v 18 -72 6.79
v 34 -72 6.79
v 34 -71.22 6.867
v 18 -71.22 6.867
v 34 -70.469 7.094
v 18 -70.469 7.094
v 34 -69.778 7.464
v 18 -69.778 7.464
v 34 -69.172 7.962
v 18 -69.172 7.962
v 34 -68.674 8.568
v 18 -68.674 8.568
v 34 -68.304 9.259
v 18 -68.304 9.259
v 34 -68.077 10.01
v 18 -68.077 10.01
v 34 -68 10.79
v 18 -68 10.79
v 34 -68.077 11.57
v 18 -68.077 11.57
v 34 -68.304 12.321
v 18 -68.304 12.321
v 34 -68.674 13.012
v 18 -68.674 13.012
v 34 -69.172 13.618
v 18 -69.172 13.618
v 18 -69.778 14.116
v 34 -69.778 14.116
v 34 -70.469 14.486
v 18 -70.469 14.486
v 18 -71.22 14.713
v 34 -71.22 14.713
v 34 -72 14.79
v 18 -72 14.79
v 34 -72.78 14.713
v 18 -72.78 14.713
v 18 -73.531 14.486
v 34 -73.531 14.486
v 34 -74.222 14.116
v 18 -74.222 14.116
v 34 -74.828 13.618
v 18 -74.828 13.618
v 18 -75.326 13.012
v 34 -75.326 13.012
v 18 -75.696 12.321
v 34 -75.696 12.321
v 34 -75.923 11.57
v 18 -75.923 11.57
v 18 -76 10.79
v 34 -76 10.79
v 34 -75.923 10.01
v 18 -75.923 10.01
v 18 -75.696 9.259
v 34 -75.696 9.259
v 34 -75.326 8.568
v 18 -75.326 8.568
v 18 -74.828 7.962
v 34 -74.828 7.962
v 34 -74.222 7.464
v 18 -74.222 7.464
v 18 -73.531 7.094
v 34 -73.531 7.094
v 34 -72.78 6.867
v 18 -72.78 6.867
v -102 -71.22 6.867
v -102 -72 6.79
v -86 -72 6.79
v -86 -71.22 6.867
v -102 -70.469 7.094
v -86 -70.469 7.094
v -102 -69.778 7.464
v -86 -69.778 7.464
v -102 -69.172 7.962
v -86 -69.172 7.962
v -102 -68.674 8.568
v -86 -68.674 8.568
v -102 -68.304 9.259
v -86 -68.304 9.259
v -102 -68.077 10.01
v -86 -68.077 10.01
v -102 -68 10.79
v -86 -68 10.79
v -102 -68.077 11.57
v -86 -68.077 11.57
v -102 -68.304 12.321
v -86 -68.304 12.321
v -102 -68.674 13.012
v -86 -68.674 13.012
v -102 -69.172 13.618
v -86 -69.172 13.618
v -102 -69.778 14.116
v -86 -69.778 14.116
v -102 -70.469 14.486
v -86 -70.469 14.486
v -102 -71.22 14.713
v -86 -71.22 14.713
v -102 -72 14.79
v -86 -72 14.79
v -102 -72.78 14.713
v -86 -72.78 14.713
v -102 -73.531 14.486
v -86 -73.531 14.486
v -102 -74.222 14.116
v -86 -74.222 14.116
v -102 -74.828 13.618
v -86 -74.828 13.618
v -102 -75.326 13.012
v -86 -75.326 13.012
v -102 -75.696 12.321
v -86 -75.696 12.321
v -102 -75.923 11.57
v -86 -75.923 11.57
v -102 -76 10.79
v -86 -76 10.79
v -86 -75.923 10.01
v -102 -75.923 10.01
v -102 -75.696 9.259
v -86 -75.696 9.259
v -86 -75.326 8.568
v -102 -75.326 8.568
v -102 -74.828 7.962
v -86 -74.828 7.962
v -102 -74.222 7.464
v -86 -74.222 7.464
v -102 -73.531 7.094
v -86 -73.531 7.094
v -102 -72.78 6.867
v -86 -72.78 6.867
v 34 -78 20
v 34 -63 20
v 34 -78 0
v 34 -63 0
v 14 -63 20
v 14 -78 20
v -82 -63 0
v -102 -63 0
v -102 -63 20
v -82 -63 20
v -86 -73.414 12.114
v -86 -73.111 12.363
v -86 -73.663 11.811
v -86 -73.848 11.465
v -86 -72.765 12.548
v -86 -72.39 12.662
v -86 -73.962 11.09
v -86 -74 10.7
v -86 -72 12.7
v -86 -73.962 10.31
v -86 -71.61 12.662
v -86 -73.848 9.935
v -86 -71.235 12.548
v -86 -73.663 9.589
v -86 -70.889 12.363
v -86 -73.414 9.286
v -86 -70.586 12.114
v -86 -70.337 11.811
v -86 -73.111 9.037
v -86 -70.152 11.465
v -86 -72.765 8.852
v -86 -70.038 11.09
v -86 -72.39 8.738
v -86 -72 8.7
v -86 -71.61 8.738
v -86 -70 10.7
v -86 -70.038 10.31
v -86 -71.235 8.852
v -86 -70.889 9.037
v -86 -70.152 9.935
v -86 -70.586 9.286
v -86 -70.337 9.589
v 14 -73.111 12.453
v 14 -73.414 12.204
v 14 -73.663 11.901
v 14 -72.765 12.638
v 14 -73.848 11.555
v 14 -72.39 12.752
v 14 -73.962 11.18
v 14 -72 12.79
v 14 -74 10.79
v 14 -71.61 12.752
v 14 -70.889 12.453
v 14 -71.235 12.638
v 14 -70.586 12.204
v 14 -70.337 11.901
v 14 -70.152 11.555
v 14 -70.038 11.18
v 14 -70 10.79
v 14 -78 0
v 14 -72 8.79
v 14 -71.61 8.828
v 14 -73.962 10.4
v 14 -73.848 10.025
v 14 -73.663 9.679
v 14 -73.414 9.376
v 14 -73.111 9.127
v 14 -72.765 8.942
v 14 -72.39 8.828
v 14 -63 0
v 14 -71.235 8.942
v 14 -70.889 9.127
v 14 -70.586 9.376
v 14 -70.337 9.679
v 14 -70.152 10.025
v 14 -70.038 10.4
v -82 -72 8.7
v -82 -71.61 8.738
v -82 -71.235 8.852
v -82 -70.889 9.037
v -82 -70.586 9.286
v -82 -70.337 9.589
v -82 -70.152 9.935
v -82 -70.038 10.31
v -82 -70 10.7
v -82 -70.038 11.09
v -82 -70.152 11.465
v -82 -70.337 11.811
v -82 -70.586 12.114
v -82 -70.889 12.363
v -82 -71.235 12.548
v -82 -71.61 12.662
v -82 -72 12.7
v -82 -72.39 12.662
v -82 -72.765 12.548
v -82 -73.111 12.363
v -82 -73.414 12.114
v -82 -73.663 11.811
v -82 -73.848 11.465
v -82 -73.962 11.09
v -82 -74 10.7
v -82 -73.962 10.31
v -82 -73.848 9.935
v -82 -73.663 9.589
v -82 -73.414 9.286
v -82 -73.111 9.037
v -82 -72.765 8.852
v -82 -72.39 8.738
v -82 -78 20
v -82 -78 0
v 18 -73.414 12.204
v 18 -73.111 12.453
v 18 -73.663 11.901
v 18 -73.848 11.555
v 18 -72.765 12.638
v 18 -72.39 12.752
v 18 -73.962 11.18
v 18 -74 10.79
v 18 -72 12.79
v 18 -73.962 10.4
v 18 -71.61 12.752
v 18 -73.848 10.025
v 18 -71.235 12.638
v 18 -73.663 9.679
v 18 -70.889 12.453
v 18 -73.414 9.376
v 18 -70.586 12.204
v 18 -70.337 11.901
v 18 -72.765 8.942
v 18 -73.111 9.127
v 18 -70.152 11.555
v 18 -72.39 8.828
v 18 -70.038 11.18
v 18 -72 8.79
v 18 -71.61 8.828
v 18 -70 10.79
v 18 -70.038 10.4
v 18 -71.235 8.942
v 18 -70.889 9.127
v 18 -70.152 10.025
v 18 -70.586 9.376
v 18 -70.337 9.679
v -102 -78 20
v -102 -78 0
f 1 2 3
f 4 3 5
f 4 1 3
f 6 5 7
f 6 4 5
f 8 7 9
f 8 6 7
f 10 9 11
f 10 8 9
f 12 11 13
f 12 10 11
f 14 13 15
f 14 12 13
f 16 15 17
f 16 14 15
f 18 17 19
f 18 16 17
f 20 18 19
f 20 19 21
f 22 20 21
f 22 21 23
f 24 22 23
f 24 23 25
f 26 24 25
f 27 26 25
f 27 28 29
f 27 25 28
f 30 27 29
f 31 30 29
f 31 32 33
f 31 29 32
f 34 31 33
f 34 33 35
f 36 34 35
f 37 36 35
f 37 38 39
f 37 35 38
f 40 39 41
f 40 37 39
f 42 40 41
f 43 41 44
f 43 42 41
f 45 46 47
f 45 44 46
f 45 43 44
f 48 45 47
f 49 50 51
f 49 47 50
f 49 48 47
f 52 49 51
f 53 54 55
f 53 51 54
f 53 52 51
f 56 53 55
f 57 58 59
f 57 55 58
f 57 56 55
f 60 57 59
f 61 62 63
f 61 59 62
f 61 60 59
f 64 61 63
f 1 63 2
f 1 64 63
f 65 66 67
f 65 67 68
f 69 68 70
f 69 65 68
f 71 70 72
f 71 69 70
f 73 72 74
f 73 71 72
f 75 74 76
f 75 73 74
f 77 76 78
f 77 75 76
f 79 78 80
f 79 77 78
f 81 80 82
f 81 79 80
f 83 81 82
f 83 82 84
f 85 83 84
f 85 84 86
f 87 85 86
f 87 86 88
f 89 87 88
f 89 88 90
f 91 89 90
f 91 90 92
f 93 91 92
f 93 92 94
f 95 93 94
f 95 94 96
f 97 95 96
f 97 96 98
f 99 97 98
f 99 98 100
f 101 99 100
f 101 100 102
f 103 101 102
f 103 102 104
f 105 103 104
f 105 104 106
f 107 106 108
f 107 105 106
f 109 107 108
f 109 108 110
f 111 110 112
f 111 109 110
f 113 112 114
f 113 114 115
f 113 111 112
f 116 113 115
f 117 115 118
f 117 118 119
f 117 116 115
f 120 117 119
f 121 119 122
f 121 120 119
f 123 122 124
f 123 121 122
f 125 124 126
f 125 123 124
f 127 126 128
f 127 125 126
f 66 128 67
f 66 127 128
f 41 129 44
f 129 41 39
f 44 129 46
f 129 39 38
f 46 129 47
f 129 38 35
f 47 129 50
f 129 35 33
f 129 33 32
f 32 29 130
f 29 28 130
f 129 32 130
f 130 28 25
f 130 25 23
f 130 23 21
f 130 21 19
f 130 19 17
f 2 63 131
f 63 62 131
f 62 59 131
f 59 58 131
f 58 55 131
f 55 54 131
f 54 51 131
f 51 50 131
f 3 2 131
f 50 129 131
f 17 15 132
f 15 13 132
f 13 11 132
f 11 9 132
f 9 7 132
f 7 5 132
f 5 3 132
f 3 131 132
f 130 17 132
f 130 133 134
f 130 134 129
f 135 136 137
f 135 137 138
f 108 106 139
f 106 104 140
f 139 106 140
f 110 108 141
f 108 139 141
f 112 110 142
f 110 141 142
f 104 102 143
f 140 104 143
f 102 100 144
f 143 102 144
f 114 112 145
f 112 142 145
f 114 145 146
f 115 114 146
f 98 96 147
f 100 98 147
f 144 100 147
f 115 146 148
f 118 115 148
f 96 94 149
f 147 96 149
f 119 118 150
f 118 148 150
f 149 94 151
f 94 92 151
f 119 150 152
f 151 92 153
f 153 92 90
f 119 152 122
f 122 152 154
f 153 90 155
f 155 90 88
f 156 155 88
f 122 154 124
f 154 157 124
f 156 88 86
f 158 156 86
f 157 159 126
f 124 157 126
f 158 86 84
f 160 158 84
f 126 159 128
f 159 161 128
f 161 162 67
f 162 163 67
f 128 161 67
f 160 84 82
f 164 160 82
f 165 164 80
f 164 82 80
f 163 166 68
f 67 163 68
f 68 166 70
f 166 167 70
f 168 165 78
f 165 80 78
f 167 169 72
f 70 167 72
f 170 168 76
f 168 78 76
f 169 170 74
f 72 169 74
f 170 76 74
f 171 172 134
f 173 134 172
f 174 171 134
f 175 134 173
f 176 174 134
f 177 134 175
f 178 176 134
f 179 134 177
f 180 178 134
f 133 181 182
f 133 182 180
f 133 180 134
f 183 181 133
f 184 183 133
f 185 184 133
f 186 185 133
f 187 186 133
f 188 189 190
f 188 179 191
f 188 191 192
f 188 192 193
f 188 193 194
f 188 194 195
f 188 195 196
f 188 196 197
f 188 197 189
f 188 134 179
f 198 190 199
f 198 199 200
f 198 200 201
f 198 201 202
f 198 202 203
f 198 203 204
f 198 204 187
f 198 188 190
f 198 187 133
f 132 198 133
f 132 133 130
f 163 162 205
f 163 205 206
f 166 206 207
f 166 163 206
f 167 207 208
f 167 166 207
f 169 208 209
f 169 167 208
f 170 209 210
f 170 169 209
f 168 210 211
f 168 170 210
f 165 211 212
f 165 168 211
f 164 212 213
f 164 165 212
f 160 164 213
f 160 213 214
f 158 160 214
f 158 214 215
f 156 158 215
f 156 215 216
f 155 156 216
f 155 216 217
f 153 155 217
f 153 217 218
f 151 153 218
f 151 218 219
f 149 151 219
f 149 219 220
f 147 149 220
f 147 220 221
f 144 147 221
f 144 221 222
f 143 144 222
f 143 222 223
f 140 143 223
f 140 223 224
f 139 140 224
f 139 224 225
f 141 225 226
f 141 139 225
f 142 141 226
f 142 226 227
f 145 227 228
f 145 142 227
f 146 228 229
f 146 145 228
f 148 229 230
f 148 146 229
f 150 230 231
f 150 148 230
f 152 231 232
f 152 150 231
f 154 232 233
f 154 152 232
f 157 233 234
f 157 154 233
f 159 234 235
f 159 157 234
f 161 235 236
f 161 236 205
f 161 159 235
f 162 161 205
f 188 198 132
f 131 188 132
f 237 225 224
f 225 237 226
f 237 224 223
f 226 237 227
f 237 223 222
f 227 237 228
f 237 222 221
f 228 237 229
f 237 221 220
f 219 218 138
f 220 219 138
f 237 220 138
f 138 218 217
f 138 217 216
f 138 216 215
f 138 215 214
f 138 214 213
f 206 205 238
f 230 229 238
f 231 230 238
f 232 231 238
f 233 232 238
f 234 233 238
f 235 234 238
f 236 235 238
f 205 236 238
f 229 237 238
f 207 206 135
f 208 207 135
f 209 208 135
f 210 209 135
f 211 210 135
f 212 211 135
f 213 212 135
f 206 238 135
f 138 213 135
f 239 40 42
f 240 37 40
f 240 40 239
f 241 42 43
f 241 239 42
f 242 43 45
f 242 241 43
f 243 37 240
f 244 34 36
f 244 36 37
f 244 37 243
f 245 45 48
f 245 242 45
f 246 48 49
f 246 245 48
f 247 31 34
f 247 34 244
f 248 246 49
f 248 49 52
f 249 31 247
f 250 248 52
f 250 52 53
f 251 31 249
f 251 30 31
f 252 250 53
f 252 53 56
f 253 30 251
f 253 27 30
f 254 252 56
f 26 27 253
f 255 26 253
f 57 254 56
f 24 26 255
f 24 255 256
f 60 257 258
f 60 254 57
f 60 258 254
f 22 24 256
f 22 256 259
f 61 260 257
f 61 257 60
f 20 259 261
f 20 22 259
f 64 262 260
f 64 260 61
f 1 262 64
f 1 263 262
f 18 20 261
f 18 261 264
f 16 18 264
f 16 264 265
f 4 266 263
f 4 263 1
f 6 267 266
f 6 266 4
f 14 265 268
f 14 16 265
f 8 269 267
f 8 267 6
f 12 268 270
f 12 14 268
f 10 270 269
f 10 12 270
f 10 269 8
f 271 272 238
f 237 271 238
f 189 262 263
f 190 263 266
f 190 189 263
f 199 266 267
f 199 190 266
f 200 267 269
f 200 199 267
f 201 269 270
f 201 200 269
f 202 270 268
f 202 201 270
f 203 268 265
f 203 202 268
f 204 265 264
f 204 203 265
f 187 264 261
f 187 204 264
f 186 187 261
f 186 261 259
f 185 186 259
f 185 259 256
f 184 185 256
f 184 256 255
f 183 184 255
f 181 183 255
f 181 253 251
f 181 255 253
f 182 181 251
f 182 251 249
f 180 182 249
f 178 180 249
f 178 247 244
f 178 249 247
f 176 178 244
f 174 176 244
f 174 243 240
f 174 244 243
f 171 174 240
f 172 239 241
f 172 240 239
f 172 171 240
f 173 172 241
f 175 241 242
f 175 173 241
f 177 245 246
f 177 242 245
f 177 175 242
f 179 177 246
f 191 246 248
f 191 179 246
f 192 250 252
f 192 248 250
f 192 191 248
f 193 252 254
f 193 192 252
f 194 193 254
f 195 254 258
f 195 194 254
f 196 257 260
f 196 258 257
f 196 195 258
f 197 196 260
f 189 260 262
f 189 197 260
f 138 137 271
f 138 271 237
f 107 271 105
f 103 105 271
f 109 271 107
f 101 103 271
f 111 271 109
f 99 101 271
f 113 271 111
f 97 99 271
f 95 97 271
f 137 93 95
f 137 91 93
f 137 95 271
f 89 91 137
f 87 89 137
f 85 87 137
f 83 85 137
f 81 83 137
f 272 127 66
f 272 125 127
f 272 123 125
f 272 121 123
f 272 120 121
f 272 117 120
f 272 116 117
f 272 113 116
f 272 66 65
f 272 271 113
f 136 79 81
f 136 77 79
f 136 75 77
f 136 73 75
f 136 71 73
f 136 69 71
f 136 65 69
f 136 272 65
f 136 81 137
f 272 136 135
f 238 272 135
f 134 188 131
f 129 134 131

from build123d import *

# Parameters (mm, degrees)
CYLINDER400_R     = 2
CYLINDER400_DEPTH = 44
CYLINDER354_R     = 4
CYLINDER354_DEPTH = 30
BOX454_W          = 20
BOX454_H          = 15
BOX454_DEPTH      = 20
CYLINDER402_R     = 2
CYLINDER402_DEPTH = 44
CYLINDER401_R     = 4
CYLINDER401_DEPTH = 30
BOX514_W          = 20
BOX514_H          = 15
BOX514_DEPTH      = 20


with BuildPart() as cylinder400:
    # Cylinder400 → Cylinder400 (new body)
    with BuildSketch(Plane(origin=(-126, -72, 10.7), x_dir=(0, 0, -1), z_dir=(1, 0, 0))):
        Circle(CYLINDER400_R)
    extrude(amount=CYLINDER400_DEPTH)


with BuildPart() as cylinder354:
    # Cylinder354 → Cylinder354 (new body)
    with BuildSketch(Plane(origin=(-116, -72, 10.79), x_dir=(0, 0, -1), z_dir=(1, 0, 0))):
        Circle(CYLINDER354_R)
    extrude(amount=CYLINDER354_DEPTH)


with BuildPart() as cut433:
    # Box454 → Box454 (new body)
    with BuildSketch(Plane(origin=(-102, -78, 0), x_dir=(1, 0, 0), z_dir=(0, 0, 1))):
        with Locations((10, 7.5)):
            Rectangle(BOX454_W, BOX454_H)
    extrude(amount=BOX454_DEPTH)

    # Cut432: cut Cylinder354
    add(cylinder354.part, mode=Mode.SUBTRACT)

    # Cut433: cut Cylinder400
    add(cylinder400.part, mode=Mode.SUBTRACT)


with BuildPart() as cylinder402:
    # Cylinder402 → Cylinder402 (new body)
    with BuildSketch(Plane(origin=(14, -72, 10.79), x_dir=(0, 0, -1), z_dir=(1, 0, 0))):
        Circle(CYLINDER402_R)
    extrude(amount=CYLINDER402_DEPTH)


with BuildPart() as cylinder401:
    # Cylinder401 → Cylinder401 (new body)
    with BuildSketch(Plane(origin=(18, -72, 10.79), x_dir=(0, 0, -1), z_dir=(1, 0, 0))):
        Circle(CYLINDER401_R)
    extrude(amount=CYLINDER401_DEPTH)


with BuildPart() as fusion398:
    # Box514 → Box514 (new body)
    with BuildSketch(Plane(origin=(14, -78, 0), x_dir=(1, 0, 0), z_dir=(0, 0, 1))):
        with Locations((10, 7.5)):
            Rectangle(BOX514_W, BOX514_H)
    extrude(amount=BOX514_DEPTH)

    # Cut434: cut Cylinder401
    add(cylinder401.part, mode=Mode.SUBTRACT)

    # Cut435: cut Cylinder402
    add(cylinder402.part, mode=Mode.SUBTRACT)

    # Fusion398: union Cut433
    add(cut433.part)


solid = fusion398.part
